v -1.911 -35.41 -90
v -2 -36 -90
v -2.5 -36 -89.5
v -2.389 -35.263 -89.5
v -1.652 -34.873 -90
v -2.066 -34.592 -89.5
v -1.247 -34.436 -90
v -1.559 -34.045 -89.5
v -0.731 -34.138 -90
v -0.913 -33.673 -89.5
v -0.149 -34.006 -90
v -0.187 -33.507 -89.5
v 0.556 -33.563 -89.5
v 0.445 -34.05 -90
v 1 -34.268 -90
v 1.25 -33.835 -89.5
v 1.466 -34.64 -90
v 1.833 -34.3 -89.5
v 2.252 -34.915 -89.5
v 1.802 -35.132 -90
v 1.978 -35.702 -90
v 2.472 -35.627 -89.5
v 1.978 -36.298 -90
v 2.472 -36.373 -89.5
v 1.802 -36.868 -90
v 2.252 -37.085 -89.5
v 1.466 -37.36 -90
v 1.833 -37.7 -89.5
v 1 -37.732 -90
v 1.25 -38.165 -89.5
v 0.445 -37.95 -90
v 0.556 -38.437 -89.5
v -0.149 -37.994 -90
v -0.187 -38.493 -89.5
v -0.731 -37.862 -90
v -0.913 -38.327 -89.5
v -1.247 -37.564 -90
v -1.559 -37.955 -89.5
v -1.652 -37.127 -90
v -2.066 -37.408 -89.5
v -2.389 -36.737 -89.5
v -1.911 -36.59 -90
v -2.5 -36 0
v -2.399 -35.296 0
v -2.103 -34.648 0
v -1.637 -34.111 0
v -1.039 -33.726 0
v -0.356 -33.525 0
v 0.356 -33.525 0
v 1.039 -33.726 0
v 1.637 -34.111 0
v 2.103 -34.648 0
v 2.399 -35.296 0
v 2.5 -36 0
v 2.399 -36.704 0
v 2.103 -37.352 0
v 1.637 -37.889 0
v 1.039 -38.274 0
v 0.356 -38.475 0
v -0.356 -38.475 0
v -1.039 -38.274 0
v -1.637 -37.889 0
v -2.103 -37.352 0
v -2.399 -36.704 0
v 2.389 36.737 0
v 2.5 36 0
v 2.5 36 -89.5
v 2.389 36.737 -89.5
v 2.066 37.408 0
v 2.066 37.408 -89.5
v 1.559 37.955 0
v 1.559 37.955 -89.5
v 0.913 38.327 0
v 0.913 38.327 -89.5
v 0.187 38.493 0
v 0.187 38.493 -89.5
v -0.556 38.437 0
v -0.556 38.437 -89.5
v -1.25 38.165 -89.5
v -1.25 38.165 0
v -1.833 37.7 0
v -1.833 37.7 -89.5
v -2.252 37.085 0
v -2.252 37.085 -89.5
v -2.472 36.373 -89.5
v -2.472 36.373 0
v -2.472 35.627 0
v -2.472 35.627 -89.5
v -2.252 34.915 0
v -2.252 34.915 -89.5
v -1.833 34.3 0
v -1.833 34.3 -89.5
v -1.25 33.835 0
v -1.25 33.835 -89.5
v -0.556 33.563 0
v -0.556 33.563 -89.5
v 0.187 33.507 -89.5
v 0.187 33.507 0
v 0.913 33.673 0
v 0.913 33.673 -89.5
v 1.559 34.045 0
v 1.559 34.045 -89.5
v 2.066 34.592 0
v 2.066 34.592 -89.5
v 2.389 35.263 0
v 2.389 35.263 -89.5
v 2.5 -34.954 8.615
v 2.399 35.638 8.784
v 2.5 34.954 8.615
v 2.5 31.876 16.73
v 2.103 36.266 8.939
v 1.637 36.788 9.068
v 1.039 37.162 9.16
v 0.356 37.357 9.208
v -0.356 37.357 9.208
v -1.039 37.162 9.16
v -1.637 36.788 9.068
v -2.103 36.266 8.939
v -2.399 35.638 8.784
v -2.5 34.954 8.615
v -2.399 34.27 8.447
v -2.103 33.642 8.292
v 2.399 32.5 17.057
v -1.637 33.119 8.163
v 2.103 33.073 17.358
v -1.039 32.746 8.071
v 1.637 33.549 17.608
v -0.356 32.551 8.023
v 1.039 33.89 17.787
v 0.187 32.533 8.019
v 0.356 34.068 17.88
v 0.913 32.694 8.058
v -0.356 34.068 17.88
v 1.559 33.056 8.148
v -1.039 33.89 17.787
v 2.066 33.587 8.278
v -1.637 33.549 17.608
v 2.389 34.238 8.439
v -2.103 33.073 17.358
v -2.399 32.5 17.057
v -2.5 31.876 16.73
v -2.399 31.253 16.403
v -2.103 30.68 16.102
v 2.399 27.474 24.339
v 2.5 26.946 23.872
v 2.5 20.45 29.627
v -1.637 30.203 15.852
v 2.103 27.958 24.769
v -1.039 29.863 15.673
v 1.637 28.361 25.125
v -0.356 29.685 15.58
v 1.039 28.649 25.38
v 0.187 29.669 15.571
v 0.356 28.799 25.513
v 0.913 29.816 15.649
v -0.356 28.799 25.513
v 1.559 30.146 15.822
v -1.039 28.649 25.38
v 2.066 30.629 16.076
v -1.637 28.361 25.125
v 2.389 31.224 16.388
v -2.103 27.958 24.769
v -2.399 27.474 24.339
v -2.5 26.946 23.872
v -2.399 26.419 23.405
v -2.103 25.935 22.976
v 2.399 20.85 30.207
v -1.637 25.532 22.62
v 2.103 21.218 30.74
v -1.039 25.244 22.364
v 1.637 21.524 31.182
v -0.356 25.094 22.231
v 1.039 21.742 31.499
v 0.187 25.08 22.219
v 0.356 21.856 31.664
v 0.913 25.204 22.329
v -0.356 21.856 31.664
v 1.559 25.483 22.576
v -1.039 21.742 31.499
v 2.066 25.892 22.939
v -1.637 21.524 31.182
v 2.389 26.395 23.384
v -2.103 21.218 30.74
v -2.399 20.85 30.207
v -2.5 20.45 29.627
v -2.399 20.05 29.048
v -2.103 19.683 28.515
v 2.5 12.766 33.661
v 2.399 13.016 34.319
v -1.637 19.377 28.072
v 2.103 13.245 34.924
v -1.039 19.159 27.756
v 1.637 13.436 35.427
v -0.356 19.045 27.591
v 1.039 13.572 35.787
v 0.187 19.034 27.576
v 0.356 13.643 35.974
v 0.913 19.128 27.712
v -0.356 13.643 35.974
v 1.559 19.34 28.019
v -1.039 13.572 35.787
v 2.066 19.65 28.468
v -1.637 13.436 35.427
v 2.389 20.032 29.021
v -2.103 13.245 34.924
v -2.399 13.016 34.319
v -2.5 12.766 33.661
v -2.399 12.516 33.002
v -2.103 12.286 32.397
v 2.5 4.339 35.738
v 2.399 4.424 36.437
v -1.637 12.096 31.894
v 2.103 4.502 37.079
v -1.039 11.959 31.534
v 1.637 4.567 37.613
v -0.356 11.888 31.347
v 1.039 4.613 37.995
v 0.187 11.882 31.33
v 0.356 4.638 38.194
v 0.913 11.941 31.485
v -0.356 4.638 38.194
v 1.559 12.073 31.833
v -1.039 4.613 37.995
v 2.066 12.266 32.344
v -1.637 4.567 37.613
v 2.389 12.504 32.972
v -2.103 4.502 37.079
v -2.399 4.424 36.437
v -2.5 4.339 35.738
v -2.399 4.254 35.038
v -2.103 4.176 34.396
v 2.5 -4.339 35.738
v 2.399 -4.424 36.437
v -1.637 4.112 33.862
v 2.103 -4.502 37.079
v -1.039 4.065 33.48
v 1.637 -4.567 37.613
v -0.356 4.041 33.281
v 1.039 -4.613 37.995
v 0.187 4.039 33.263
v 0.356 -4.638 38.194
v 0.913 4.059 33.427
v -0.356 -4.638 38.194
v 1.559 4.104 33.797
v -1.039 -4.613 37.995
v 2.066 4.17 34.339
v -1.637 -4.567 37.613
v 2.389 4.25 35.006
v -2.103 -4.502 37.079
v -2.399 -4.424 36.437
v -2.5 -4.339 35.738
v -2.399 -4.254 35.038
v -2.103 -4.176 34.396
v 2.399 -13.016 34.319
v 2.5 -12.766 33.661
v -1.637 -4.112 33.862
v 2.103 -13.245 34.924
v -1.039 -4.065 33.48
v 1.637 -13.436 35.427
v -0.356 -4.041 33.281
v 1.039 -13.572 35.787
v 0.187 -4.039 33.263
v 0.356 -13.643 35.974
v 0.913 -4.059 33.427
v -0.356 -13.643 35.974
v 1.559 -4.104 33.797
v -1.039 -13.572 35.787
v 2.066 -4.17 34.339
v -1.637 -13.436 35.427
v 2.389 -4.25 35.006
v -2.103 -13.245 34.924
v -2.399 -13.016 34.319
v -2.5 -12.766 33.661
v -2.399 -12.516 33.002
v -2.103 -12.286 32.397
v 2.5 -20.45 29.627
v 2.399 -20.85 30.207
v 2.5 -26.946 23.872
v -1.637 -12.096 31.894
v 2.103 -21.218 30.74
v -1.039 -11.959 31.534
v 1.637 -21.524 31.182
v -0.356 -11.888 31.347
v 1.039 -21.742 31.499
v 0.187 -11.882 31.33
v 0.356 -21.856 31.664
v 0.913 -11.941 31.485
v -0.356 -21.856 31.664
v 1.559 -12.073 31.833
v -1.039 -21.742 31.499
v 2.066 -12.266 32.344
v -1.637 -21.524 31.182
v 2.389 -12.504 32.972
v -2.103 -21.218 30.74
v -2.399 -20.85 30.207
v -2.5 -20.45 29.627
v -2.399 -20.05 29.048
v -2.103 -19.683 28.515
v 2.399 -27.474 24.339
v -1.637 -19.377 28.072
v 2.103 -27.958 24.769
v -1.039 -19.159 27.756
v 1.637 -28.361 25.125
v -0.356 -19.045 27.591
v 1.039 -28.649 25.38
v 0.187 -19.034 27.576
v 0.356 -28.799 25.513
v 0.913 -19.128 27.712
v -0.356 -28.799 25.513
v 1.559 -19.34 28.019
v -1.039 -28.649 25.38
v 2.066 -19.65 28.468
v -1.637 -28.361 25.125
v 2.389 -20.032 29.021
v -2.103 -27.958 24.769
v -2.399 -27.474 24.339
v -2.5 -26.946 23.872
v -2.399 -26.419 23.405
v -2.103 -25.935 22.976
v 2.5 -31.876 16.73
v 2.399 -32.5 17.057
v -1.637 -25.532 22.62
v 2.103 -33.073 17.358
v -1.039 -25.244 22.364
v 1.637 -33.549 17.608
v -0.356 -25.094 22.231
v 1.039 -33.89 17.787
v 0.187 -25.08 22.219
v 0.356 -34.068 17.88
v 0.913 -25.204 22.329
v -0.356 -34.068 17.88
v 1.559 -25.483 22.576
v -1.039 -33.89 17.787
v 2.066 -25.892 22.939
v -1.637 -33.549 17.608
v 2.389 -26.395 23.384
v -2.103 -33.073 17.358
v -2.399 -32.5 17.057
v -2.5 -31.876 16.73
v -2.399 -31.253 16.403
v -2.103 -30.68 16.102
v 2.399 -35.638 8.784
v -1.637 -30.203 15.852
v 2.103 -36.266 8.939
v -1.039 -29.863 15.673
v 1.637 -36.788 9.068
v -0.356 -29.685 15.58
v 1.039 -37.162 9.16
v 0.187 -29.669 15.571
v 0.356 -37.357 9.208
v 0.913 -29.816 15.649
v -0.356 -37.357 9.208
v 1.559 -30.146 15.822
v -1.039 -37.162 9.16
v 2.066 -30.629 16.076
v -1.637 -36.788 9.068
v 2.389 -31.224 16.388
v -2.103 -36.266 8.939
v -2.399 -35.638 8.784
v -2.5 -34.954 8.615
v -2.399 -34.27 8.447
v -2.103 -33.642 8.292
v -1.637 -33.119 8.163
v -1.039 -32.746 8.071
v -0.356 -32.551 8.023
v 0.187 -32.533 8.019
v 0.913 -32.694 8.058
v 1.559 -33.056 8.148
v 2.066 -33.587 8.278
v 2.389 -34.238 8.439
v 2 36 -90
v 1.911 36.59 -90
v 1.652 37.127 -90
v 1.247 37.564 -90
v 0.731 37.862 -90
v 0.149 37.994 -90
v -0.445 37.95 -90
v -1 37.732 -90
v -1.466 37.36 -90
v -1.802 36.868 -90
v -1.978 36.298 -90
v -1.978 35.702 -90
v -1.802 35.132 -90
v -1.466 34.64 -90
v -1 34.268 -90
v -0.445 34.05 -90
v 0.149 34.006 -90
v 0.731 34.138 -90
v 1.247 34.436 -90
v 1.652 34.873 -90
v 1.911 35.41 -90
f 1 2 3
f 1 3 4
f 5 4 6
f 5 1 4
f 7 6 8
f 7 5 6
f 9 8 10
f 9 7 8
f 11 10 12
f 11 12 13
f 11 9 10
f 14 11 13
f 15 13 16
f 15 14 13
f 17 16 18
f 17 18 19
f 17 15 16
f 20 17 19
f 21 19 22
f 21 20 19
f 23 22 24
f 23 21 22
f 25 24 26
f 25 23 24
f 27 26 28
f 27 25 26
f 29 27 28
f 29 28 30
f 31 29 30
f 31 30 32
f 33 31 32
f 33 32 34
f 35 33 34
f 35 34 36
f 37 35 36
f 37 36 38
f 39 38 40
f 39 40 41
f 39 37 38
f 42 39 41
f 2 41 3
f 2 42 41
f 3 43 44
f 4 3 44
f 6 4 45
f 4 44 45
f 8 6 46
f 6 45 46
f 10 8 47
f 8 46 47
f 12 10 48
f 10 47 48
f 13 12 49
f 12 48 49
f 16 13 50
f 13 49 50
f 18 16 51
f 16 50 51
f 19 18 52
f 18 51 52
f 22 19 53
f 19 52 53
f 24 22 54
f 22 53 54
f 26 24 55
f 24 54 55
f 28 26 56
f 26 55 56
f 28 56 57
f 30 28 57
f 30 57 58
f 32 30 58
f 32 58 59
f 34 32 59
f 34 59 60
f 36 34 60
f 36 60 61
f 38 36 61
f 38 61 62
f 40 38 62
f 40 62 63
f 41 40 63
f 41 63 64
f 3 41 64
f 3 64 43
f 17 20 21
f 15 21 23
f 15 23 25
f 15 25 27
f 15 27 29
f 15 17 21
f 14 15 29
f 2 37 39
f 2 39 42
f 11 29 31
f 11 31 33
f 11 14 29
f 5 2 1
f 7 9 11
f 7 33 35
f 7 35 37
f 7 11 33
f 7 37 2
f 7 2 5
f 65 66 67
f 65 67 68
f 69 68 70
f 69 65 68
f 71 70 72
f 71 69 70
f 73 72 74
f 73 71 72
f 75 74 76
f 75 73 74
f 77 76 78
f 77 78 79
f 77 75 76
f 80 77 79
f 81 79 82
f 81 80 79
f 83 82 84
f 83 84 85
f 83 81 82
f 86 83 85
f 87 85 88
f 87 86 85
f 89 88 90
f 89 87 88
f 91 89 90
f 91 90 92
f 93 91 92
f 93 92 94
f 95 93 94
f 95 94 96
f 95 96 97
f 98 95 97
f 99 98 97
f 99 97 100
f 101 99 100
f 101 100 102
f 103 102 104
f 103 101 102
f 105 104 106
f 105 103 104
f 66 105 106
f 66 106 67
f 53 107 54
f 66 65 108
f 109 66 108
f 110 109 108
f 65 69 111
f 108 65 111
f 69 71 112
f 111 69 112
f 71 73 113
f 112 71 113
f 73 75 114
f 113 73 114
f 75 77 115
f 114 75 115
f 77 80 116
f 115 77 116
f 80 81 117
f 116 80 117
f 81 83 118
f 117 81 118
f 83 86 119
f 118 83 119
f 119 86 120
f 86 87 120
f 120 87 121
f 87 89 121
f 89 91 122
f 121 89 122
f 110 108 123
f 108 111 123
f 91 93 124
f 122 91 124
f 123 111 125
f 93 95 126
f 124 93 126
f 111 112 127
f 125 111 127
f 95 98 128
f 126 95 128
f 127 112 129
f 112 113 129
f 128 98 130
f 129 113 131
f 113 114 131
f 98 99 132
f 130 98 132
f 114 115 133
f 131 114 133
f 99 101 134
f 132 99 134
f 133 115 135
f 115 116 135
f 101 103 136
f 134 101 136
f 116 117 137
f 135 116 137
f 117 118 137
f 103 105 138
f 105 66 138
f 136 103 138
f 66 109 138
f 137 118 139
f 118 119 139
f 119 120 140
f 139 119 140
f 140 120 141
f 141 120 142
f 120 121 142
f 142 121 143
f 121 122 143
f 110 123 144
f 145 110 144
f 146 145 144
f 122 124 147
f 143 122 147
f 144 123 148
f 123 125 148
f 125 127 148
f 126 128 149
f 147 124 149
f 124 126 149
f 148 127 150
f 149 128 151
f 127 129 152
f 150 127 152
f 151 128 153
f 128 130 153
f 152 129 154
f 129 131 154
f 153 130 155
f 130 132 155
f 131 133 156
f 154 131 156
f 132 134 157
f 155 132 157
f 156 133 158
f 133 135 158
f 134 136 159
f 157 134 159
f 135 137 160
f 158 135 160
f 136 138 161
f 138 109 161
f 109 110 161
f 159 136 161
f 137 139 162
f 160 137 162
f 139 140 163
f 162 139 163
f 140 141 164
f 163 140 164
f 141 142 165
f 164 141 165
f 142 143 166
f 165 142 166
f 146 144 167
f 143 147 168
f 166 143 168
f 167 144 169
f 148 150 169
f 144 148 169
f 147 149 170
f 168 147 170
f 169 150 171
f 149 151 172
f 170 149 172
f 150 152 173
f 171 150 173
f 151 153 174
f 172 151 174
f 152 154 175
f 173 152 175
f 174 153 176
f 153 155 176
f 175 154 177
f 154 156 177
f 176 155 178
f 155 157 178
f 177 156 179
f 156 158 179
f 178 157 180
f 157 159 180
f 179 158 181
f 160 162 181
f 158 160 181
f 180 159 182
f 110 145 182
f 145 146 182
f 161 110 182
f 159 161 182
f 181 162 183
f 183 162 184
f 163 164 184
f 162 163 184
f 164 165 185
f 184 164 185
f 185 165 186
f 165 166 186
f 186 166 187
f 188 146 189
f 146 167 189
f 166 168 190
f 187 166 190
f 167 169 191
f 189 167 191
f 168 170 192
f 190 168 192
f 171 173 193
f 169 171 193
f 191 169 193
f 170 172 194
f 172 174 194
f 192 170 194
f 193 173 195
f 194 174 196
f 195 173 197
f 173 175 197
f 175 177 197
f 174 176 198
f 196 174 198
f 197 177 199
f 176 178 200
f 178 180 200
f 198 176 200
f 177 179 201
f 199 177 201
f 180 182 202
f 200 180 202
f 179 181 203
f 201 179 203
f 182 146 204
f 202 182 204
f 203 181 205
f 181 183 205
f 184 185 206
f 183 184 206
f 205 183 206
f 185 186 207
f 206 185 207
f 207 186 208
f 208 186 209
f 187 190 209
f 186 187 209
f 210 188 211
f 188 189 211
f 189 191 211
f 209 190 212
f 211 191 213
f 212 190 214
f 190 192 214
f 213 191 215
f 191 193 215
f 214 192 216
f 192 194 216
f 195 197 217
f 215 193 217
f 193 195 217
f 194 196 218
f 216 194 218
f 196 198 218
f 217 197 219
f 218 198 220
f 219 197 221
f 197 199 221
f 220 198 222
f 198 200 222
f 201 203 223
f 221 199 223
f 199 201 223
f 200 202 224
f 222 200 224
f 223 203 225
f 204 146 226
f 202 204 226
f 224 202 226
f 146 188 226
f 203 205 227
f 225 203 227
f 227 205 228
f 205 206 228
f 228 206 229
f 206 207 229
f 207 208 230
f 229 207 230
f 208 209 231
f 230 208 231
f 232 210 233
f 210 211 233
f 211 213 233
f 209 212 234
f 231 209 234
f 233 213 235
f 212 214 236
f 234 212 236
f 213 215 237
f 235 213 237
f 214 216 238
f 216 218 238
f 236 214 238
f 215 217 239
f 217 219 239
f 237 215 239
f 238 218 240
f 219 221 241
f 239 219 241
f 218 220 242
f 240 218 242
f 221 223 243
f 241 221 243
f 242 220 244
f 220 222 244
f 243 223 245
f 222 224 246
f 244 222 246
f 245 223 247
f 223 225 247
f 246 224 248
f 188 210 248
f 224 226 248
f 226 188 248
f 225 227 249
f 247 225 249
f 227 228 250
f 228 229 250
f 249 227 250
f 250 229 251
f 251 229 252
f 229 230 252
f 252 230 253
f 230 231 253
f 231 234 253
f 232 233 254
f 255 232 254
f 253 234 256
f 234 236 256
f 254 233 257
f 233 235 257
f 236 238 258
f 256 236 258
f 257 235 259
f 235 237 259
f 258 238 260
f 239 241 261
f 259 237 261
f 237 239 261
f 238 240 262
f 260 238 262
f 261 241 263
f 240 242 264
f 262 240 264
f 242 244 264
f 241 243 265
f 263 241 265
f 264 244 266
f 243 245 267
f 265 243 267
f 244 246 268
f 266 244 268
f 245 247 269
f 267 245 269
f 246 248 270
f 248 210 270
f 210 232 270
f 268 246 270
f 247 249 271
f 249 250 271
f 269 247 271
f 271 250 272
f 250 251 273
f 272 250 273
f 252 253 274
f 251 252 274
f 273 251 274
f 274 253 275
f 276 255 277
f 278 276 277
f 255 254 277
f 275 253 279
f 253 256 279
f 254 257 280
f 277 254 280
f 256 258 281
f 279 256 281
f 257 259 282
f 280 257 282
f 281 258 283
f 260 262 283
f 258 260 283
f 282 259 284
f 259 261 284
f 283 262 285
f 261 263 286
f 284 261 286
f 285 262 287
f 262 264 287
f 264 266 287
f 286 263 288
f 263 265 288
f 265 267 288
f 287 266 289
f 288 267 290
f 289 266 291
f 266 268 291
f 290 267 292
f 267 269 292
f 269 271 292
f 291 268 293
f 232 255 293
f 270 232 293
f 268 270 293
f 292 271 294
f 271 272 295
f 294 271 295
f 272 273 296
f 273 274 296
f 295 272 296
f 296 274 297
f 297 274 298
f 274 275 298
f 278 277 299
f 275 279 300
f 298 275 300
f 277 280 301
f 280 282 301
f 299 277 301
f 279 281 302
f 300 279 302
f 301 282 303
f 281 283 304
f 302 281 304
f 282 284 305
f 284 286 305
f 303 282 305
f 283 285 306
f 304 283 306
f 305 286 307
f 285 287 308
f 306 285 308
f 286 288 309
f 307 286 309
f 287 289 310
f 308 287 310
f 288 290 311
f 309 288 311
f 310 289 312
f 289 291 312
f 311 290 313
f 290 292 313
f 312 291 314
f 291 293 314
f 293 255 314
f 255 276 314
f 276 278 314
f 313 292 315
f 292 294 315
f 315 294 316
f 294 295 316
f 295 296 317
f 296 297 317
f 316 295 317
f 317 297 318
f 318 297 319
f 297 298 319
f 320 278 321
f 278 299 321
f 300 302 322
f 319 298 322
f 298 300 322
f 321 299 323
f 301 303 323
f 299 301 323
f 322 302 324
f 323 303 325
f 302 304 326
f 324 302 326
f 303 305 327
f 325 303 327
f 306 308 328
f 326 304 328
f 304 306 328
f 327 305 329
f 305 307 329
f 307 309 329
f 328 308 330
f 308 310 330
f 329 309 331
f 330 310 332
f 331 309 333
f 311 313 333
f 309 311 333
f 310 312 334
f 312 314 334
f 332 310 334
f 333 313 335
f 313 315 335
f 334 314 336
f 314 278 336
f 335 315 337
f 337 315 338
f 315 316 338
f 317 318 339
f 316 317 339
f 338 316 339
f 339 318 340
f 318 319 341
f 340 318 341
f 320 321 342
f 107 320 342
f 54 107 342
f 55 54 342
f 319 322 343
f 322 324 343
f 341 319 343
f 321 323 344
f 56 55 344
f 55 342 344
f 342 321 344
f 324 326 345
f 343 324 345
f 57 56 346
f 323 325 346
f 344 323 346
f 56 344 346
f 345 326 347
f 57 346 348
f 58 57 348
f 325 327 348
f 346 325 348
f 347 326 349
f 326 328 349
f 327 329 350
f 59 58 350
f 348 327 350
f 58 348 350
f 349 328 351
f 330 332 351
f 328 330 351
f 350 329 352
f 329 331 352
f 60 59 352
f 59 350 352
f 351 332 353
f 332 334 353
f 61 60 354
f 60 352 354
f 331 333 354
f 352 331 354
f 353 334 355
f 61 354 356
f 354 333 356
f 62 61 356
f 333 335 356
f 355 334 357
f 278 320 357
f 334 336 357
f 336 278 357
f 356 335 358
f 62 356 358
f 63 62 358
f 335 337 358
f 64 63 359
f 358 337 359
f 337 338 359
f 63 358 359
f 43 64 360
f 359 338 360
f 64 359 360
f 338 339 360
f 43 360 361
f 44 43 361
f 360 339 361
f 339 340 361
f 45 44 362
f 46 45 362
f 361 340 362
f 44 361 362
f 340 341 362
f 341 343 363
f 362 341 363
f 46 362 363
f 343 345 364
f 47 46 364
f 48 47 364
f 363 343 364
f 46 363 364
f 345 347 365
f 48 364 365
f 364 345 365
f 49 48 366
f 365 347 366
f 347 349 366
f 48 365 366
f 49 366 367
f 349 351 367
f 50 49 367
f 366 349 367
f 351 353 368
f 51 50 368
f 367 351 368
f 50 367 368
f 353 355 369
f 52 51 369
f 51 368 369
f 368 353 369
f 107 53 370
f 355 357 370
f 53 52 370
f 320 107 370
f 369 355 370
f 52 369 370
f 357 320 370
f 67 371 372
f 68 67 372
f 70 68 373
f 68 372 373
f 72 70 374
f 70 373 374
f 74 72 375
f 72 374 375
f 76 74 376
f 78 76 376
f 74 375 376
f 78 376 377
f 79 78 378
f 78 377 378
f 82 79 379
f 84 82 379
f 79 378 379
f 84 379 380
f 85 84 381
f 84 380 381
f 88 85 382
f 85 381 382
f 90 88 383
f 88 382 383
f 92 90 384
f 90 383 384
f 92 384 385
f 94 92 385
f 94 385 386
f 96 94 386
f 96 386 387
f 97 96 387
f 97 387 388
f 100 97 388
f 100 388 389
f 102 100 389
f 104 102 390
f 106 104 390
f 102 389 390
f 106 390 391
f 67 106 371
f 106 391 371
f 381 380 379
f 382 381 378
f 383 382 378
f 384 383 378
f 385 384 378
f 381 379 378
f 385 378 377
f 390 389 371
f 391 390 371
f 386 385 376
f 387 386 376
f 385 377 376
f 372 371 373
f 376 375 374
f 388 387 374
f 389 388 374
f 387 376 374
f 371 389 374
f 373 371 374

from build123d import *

# Parameters (mm, degrees)
SKETCH1_R           = 2.5
REVOLVE1_ANGLE      = 180
SKETCH1_2_R         = 2.5
BOSS_EXTRUDE1_DEPTH = 90
SKETCH2_R           = 2.5
BOSS_EXTRUDE2_DEPTH = 90
CHAMFER1_SIZE       = 0.5


with BuildPart() as part:
    # Sketch1 → Revolve1 (revolve)
    with BuildSketch(Plane.XY):
        with Locations((0, 36)):
            Circle(SKETCH1_R)
    revolve(axis=Axis((0, 0, 0), (1, 0, 0)), revolution_arc=REVOLVE1_ANGLE)

    # Sketch1<2> → Boss-Extrude1 (add)
    with BuildSketch(Plane.XY):
        with Locations((0, 36)):
            Circle(SKETCH1_2_R)
    extrude(amount=-BOSS_EXTRUDE1_DEPTH)

    # Sketch2 → Boss-Extrude2 (add)
    with BuildSketch(Plane(origin=(0, 0, 0), x_dir=(-1, 0, 0), z_dir=(0, 0, -1))):
        with Locations((0, -36)):
            Circle(SKETCH2_R)
    extrude(amount=BOSS_EXTRUDE2_DEPTH)

    # Chamfer1
    chamfer1_edges = [part.edges().sort_by_distance(p)[0] for p in [
        (2.5, -36, -90),
        (-2.5, 36, -90),
    ]]
    chamfer(chamfer1_edges, length=CHAMFER1_SIZE)


solid = part.part
